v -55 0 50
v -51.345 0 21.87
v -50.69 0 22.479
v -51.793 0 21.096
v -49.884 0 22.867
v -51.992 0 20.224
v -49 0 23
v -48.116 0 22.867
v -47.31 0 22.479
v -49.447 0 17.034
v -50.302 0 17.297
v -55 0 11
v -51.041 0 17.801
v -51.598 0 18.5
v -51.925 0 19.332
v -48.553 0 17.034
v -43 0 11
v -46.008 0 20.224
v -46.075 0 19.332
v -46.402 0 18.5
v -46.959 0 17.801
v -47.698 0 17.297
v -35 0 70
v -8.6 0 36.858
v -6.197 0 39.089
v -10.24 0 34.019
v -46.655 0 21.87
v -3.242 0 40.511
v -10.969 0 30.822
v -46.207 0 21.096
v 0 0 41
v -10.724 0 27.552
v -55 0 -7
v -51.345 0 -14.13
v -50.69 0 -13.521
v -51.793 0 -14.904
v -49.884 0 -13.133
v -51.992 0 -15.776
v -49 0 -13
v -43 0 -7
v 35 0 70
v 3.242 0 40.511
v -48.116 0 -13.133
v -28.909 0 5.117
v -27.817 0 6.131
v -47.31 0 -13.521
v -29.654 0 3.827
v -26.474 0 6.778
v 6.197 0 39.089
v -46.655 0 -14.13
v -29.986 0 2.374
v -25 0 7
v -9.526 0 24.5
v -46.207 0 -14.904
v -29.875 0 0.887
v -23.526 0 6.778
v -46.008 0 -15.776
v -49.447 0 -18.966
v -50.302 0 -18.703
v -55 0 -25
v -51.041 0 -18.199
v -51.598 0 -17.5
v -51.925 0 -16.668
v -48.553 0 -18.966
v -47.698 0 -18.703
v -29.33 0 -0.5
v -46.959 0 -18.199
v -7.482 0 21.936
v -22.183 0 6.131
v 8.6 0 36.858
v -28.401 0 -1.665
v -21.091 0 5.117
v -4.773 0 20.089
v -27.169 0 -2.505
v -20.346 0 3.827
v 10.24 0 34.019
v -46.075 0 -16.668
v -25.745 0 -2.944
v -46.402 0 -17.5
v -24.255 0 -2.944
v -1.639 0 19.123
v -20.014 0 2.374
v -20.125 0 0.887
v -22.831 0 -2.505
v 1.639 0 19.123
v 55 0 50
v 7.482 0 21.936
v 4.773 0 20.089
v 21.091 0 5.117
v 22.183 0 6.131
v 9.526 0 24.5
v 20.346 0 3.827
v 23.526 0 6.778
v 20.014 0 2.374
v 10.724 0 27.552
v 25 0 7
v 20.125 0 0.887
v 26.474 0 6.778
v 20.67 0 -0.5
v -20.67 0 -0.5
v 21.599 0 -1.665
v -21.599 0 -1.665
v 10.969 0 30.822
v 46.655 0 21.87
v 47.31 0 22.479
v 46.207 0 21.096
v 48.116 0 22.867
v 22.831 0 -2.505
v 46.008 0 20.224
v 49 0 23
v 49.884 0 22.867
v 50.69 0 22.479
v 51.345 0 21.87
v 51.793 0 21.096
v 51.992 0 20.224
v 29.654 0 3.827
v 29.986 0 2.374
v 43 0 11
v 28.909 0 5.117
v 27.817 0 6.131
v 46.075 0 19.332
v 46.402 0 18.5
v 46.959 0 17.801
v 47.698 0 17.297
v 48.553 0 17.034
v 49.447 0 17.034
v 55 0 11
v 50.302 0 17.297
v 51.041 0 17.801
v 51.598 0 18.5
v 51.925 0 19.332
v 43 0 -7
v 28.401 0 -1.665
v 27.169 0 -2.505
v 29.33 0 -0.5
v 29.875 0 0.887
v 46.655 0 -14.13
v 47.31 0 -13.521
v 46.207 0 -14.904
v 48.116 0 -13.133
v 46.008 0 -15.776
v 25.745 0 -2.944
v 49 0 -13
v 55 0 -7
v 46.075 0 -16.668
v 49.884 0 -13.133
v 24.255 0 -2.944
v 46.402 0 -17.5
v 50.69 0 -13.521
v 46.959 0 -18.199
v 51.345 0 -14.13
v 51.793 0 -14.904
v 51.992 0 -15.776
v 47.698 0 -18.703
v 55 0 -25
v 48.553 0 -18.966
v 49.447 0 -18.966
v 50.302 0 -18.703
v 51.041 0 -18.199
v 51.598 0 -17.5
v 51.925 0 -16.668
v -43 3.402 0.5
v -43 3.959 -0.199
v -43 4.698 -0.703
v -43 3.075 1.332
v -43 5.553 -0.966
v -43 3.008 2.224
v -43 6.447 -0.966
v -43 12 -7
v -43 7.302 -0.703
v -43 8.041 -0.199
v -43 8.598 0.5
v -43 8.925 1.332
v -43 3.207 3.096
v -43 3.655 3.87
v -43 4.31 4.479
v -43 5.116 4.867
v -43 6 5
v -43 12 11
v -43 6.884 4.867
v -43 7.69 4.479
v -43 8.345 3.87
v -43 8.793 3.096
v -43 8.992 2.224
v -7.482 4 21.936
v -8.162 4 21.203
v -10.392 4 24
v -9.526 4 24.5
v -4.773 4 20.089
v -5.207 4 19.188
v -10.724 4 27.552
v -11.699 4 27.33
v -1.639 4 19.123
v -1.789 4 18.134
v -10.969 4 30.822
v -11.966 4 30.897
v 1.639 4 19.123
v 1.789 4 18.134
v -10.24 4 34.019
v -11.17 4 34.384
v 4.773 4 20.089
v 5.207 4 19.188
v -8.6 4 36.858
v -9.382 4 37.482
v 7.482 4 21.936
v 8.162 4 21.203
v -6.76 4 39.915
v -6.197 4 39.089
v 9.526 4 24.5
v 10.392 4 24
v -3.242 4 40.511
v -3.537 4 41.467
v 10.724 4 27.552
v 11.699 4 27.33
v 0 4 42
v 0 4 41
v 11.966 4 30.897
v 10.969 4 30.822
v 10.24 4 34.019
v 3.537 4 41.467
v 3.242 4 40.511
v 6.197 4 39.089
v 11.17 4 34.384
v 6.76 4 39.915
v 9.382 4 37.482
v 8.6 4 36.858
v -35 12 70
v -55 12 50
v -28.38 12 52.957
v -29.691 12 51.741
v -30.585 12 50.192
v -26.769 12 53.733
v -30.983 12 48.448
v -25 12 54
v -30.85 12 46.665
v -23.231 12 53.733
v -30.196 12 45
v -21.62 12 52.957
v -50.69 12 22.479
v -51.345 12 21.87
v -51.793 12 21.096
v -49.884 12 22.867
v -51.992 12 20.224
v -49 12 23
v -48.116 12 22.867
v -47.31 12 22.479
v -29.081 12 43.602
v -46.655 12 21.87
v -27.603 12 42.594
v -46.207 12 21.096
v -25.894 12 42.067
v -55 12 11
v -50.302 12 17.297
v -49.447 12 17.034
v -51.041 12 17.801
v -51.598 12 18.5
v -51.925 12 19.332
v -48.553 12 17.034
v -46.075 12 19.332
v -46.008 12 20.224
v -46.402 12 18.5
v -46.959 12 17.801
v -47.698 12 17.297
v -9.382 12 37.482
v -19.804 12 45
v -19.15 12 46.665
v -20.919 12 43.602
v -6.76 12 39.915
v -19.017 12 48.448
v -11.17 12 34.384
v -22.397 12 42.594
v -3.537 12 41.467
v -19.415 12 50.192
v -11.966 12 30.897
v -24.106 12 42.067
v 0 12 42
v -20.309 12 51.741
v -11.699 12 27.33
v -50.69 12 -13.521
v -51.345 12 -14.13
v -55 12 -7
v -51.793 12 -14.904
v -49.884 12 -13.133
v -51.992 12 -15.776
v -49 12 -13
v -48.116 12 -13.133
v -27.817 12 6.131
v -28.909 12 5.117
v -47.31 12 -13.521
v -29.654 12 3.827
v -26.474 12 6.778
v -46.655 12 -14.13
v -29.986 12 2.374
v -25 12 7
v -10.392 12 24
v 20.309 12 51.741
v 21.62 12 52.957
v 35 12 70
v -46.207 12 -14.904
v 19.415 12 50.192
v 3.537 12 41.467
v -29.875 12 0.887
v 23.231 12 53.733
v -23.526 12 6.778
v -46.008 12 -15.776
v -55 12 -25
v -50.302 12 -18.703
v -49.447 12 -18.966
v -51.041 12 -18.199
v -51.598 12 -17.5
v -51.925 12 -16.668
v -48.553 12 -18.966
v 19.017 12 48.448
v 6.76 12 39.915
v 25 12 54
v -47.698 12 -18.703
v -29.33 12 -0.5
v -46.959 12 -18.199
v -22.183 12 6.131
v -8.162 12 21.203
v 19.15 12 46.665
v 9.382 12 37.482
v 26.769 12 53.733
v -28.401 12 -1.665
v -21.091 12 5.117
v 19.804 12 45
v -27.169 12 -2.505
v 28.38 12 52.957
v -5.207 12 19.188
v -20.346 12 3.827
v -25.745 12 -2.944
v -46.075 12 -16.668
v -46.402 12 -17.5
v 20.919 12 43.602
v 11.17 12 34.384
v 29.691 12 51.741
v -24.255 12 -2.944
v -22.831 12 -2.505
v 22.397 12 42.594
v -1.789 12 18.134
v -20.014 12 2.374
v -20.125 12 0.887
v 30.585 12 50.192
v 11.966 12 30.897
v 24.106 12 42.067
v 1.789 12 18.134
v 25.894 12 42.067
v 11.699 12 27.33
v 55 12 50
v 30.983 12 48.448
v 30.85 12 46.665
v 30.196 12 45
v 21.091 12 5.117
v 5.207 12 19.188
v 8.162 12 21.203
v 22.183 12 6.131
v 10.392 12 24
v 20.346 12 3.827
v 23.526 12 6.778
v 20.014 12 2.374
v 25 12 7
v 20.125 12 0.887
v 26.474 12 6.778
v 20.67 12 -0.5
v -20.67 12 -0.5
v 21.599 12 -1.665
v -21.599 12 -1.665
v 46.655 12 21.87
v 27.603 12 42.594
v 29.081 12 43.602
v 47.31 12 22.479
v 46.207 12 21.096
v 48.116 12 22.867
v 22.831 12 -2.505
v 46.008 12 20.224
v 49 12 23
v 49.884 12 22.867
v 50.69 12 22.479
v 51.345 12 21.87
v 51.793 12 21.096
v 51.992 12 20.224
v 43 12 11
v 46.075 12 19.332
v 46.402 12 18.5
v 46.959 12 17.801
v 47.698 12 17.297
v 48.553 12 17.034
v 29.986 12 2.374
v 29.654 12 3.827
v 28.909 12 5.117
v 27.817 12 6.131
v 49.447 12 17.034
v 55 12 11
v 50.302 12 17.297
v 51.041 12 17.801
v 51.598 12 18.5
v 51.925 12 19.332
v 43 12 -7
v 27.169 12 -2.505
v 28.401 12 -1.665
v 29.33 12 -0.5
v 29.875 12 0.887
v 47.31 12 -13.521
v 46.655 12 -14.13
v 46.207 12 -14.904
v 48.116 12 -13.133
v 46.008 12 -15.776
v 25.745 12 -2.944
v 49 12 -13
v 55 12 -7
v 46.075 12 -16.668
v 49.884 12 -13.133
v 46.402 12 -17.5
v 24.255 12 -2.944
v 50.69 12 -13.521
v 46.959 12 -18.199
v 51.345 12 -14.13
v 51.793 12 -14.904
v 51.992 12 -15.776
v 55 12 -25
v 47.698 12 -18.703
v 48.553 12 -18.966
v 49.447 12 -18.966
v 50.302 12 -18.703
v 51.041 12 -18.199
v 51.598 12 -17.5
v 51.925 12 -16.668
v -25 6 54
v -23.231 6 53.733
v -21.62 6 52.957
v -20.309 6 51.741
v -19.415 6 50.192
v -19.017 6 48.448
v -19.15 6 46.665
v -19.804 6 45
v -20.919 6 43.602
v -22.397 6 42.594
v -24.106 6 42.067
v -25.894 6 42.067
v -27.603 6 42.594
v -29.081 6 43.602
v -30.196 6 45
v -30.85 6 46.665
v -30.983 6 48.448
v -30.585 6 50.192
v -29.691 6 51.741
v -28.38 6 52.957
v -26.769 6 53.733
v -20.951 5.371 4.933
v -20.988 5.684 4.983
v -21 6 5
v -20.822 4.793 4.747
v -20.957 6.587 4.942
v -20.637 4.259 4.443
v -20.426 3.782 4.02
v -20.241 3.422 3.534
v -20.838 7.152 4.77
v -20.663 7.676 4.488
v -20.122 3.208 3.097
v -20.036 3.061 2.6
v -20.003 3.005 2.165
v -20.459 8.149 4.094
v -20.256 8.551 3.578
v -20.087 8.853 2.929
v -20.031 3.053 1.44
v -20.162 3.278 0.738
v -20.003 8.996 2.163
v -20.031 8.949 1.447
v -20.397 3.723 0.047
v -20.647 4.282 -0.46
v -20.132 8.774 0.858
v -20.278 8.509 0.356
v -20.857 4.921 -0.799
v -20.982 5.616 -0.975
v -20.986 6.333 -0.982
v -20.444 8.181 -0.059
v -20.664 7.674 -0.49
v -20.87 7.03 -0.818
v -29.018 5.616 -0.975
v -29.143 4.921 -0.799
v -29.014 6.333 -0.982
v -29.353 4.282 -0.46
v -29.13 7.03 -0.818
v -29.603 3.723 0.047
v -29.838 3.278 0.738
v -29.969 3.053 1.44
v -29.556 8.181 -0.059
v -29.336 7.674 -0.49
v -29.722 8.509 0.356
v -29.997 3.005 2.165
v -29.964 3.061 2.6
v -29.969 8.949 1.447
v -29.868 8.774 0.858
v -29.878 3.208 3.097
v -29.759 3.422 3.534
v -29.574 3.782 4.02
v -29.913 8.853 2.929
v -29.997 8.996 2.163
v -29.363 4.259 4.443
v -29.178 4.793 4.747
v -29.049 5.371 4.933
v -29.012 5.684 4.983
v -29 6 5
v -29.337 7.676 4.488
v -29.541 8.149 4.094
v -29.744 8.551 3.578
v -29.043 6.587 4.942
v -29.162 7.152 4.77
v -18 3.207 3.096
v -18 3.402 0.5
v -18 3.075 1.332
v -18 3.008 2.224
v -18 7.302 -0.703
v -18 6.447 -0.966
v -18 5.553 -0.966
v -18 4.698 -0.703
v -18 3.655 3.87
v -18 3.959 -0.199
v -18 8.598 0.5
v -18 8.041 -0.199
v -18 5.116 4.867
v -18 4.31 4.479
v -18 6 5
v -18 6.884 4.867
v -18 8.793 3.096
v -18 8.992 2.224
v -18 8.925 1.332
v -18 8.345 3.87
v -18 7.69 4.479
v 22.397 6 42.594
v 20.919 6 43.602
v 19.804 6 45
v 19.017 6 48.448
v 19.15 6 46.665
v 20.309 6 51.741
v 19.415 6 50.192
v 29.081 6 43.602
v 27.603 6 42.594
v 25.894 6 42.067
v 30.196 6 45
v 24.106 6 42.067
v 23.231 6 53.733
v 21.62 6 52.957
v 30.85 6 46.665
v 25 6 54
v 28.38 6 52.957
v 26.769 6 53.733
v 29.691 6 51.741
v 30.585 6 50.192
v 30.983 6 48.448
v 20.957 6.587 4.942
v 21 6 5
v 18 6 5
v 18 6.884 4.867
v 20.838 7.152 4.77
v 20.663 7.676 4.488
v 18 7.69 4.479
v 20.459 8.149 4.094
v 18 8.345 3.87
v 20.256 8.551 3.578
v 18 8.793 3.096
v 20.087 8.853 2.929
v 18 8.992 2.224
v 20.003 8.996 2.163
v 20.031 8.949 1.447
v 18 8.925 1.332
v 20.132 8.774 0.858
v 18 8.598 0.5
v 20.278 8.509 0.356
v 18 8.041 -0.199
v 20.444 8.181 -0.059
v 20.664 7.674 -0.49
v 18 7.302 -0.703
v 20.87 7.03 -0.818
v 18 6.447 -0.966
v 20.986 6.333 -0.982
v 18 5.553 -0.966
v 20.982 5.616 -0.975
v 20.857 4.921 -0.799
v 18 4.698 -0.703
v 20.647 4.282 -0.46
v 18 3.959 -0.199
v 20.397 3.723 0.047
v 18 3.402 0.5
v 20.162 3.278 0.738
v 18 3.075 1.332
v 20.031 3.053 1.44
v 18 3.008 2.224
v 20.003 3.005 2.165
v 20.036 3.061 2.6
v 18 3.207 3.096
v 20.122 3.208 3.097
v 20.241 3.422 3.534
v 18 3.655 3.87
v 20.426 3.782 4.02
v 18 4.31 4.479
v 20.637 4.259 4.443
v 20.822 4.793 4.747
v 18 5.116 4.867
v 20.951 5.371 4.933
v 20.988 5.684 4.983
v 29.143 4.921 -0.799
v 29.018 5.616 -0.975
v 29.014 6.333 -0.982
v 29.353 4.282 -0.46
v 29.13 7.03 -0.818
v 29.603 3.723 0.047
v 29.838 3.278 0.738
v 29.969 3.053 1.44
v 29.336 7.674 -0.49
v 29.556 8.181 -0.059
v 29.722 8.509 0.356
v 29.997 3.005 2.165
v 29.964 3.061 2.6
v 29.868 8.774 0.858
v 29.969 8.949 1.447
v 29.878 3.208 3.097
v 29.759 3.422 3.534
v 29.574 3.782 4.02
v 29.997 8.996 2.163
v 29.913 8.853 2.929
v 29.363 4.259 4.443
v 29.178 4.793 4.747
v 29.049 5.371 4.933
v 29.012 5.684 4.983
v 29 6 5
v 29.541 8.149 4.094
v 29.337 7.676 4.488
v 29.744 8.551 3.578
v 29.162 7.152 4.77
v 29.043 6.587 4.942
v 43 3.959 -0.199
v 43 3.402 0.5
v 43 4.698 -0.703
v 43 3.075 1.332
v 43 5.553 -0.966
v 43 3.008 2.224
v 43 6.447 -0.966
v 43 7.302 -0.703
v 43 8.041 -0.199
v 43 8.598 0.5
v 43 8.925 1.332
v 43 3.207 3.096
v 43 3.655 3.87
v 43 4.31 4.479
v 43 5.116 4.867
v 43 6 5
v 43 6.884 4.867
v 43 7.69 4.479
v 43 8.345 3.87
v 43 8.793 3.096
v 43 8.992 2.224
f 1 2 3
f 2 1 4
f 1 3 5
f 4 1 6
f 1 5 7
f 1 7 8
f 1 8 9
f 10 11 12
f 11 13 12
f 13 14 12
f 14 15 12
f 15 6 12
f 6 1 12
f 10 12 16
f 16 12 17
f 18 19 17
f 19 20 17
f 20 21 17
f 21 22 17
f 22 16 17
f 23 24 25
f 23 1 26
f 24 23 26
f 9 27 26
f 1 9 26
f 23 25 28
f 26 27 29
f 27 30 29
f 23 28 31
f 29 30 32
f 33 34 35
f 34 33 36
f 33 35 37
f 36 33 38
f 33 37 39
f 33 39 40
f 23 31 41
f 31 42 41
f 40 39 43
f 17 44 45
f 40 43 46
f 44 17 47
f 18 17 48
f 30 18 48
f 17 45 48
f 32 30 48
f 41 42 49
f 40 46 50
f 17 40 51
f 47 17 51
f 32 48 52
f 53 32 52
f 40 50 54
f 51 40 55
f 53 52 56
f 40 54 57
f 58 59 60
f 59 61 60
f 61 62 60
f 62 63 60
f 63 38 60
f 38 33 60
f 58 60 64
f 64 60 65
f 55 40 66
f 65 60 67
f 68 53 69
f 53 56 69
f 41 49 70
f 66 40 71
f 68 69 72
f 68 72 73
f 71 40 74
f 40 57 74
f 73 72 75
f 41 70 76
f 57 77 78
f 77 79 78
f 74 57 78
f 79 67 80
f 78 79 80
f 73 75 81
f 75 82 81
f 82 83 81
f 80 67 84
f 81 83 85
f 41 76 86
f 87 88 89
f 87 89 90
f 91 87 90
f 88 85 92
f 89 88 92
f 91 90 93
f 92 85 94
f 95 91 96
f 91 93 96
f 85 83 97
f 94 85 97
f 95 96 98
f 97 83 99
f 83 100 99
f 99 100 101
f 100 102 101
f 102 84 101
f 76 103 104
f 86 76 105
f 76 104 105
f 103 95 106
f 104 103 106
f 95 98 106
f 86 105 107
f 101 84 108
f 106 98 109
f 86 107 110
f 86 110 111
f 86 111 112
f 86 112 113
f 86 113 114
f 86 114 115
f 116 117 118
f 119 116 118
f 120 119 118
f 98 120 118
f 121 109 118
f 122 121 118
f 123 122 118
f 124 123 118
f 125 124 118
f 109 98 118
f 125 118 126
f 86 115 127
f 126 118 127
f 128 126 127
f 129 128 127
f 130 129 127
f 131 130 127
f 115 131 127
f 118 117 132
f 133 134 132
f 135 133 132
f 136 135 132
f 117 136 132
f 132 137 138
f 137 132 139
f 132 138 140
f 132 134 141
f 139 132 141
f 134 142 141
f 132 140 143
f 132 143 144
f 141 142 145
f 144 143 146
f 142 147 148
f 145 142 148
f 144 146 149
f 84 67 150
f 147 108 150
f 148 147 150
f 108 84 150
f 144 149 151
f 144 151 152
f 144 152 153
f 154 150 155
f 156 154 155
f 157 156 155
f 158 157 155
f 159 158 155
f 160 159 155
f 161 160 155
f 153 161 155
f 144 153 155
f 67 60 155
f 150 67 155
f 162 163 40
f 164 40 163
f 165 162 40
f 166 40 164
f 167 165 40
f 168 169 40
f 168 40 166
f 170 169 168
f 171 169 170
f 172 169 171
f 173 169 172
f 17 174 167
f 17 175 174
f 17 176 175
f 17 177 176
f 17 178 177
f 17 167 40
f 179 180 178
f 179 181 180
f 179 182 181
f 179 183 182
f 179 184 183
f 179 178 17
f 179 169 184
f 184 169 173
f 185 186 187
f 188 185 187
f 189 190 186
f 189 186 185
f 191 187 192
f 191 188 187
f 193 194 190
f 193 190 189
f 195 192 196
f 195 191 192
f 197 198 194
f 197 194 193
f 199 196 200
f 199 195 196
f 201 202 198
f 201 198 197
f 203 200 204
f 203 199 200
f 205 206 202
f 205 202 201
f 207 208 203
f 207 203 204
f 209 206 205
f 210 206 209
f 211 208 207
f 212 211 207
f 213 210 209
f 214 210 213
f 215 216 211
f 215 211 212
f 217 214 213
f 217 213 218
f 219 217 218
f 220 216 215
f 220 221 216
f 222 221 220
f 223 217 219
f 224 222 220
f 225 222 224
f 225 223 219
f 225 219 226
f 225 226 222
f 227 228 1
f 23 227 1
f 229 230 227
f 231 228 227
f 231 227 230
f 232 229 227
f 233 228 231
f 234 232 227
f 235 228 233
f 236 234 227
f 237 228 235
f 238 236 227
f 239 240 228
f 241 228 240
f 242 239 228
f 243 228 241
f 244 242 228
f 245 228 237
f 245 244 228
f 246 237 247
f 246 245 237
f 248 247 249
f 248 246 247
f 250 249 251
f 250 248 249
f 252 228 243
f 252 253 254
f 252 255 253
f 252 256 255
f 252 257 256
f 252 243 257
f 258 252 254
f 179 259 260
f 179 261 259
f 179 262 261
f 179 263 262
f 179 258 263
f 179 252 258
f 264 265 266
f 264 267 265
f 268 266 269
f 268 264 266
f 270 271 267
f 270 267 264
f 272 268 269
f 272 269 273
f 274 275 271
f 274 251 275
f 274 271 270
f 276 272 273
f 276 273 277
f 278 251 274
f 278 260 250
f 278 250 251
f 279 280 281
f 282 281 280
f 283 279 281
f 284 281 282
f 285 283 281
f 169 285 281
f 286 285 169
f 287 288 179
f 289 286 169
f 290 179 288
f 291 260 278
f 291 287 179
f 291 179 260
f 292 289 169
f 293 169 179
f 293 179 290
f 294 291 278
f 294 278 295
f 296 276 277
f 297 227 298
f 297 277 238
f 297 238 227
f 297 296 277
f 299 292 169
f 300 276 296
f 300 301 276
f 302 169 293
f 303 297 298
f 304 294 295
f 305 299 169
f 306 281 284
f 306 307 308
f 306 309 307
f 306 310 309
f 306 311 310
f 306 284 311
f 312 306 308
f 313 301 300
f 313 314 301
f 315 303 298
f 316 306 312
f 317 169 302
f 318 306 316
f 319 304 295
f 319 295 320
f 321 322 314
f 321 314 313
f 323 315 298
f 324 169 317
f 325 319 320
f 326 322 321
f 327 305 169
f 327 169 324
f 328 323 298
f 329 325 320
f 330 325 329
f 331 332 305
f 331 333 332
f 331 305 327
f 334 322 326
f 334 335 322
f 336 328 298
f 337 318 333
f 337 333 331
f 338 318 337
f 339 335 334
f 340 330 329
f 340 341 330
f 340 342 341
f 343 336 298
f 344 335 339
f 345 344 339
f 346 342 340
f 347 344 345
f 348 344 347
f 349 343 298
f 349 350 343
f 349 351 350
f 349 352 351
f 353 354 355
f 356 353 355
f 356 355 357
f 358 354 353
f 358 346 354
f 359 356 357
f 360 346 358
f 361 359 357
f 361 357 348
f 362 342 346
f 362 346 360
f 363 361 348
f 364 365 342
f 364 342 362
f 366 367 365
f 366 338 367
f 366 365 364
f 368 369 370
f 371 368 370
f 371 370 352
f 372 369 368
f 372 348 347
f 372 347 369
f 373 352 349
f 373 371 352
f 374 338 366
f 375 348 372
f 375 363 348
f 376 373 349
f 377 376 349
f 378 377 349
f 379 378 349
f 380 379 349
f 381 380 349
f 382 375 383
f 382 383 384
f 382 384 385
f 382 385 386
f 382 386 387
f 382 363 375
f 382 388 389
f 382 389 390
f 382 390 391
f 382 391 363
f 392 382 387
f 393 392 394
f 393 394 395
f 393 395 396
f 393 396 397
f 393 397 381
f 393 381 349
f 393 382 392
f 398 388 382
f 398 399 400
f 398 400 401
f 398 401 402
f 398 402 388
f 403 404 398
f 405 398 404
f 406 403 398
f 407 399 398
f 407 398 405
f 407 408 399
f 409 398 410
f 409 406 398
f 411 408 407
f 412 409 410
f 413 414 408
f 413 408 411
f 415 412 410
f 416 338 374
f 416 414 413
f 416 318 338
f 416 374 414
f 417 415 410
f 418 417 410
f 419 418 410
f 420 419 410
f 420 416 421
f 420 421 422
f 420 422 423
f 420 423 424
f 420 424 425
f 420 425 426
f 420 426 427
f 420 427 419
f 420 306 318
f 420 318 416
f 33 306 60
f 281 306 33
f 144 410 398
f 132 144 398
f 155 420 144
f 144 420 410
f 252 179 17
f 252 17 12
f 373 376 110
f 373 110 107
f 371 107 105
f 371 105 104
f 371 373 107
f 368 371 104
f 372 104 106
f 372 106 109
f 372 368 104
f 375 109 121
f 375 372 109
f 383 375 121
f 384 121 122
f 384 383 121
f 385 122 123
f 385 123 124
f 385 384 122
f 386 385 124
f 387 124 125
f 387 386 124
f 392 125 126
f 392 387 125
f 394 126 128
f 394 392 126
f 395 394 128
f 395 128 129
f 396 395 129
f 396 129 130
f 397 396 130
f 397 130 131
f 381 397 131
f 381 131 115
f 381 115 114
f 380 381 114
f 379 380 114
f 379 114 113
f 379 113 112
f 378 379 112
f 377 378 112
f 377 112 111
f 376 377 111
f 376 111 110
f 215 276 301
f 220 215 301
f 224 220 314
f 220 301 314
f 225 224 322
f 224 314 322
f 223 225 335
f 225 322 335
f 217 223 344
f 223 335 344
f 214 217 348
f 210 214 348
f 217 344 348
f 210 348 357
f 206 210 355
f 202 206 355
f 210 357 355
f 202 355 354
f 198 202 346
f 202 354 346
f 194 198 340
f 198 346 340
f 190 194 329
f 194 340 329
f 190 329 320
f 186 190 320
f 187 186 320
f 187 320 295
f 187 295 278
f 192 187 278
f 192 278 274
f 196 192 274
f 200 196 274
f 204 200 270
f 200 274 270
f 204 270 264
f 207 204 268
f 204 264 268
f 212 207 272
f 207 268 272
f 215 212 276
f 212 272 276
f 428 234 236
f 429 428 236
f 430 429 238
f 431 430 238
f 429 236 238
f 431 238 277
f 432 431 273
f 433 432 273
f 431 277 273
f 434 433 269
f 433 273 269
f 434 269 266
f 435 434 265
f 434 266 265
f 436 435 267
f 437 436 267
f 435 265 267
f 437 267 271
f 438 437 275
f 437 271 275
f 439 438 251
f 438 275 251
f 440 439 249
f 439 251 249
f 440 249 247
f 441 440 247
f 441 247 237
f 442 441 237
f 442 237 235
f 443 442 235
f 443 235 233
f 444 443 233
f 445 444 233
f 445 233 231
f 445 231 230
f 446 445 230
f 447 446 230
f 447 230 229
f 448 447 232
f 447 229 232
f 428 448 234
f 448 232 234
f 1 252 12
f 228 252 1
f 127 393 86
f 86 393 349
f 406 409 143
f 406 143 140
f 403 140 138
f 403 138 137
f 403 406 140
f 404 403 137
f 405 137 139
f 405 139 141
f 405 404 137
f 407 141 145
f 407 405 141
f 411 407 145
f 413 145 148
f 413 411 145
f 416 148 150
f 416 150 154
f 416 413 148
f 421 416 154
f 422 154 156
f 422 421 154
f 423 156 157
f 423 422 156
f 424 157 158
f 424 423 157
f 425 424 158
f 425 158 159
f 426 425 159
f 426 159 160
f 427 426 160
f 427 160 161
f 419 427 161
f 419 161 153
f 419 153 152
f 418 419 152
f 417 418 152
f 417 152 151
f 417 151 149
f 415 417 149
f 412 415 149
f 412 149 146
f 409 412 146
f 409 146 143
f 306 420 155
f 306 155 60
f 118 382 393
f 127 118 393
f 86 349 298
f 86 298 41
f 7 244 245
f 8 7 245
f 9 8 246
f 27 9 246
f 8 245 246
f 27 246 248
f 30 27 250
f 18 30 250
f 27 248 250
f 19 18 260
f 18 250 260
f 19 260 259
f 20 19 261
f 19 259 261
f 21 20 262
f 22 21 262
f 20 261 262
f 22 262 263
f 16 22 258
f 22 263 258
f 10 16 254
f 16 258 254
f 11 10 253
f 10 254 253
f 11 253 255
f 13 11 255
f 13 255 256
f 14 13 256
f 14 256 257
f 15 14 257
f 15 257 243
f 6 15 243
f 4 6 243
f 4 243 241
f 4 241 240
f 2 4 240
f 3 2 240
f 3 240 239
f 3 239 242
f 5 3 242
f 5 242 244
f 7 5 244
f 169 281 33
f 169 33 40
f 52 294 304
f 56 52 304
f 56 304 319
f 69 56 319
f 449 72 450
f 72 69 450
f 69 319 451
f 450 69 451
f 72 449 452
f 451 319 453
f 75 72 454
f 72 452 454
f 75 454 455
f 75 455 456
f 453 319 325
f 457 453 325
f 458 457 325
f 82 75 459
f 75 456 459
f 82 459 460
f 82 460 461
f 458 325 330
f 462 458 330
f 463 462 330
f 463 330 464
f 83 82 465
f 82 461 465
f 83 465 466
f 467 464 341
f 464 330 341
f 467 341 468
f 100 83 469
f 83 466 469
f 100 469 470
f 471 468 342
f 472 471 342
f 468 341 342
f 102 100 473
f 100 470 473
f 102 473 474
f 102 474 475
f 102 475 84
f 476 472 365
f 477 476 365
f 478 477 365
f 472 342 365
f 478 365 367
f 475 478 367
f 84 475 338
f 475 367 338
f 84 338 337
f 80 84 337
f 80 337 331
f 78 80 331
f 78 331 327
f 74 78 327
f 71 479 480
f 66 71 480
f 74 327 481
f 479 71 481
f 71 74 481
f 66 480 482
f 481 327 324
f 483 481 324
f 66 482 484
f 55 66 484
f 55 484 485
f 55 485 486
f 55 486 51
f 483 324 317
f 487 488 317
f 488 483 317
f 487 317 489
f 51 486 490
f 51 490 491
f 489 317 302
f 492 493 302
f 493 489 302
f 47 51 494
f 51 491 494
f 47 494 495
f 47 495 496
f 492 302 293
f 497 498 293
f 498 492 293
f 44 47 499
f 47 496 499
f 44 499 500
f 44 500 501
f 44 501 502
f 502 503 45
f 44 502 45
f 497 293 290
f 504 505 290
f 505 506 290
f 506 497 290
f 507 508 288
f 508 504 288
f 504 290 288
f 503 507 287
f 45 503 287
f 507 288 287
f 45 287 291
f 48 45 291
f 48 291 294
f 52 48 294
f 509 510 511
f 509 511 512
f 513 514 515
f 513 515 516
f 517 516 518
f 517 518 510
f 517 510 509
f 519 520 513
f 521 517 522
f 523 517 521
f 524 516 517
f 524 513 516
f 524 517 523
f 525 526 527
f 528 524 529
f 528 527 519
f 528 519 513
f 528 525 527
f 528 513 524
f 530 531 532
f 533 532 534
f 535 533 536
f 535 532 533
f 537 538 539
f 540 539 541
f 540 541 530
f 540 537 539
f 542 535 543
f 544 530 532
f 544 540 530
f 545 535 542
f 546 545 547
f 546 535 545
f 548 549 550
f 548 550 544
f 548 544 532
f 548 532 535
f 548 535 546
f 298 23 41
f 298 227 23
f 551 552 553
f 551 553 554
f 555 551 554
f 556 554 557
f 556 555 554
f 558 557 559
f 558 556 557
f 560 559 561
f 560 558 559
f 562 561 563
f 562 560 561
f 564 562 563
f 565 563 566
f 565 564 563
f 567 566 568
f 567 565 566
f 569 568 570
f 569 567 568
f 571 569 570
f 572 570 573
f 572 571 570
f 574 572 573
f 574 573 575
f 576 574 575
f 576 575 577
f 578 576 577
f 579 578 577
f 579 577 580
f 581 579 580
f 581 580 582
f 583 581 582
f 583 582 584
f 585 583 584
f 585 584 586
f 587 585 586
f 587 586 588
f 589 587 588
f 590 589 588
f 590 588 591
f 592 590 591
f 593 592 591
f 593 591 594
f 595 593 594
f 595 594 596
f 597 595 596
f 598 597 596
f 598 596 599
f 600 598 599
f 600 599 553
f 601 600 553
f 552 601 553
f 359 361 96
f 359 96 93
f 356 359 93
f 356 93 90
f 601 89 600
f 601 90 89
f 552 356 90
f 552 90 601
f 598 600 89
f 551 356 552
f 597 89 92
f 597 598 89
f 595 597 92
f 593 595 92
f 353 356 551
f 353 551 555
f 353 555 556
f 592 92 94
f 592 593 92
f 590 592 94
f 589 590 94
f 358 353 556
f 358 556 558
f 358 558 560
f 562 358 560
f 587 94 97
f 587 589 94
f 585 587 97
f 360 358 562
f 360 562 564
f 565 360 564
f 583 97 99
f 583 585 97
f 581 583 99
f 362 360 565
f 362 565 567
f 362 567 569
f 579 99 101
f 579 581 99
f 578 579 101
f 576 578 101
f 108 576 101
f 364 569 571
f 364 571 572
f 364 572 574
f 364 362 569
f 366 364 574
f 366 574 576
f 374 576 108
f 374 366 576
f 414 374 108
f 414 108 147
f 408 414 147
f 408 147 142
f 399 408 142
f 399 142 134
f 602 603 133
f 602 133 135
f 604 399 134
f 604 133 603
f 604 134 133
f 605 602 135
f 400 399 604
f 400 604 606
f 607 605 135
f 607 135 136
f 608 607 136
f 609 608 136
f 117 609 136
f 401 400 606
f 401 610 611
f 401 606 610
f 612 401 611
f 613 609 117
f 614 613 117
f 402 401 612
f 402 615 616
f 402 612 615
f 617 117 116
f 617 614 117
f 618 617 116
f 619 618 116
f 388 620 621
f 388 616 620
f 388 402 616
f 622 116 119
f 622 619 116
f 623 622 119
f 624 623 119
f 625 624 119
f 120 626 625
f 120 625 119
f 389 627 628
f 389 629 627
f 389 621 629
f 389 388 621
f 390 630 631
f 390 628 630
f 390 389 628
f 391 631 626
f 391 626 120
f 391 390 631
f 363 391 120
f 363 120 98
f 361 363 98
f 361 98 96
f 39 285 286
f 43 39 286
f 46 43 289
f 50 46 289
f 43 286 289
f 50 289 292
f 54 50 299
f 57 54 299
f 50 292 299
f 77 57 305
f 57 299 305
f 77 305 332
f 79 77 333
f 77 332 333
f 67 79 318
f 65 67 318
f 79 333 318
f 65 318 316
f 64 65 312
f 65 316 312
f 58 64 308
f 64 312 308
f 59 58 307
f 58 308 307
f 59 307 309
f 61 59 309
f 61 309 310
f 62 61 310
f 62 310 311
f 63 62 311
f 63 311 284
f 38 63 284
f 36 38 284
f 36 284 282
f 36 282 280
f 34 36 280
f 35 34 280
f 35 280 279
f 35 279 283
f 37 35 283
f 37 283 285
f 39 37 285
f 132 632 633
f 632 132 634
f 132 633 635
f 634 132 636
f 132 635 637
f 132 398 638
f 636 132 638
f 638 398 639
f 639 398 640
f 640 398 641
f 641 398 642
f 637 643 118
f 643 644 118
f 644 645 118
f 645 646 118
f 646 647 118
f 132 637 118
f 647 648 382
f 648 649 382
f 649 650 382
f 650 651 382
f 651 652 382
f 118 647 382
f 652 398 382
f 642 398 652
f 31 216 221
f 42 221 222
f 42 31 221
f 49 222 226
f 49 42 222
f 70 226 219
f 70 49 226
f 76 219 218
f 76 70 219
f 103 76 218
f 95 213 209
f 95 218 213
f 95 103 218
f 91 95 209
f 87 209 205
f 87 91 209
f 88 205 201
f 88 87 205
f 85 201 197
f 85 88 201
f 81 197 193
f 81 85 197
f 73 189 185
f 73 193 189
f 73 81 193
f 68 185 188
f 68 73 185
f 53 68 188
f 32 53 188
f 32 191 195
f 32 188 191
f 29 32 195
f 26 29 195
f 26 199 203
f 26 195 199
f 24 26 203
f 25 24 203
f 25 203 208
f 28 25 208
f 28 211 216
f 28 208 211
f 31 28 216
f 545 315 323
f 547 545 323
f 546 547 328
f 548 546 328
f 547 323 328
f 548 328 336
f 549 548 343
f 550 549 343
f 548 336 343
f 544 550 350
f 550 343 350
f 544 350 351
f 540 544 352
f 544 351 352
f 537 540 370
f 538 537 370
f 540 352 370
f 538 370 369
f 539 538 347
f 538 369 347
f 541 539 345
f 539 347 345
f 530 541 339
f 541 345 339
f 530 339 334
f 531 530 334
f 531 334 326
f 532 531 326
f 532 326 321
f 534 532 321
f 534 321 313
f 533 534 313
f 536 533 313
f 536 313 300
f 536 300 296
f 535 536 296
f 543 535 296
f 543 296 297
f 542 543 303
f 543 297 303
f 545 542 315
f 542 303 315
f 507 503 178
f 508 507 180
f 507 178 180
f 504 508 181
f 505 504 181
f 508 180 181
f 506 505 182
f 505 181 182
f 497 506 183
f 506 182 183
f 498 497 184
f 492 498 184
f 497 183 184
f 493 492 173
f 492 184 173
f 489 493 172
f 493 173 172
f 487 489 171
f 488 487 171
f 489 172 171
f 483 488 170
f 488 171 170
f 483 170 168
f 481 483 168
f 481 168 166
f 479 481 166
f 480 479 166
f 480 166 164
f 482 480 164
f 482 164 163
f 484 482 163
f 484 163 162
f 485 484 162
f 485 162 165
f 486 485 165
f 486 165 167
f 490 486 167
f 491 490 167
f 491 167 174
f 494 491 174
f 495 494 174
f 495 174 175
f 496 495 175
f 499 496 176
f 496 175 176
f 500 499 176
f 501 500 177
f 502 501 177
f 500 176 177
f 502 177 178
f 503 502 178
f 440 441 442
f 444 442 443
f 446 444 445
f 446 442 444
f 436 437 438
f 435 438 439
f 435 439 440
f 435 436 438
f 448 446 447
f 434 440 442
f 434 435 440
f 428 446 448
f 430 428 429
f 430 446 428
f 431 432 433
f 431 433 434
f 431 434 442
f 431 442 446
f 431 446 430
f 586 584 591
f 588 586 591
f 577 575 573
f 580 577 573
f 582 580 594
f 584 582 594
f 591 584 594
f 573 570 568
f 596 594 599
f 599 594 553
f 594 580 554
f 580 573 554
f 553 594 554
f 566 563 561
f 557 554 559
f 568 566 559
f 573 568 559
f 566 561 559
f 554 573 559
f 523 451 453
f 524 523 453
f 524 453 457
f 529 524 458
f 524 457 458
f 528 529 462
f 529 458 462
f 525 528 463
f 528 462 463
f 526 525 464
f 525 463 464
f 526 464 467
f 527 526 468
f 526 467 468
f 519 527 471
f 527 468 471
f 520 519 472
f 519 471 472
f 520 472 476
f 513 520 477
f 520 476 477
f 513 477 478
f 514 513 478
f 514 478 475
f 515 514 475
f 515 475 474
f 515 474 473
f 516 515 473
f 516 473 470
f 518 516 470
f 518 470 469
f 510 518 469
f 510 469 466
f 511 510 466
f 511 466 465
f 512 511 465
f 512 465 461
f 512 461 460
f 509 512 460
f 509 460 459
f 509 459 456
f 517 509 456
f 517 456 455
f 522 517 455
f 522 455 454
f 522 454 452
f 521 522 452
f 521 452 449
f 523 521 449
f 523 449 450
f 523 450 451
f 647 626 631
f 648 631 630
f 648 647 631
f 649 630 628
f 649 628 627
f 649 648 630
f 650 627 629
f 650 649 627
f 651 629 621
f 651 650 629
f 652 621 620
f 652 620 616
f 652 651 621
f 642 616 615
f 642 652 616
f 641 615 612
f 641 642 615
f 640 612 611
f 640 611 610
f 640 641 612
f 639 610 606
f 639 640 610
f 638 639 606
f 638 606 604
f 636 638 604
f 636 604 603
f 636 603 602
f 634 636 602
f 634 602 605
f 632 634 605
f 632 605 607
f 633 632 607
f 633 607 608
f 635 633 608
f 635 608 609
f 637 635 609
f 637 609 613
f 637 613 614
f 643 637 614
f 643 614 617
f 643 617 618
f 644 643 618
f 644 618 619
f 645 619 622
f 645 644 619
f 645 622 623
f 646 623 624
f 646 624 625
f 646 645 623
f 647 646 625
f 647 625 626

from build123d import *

# Parameters (mm, degrees)
SKETCH1_W           = 66
SKETCH1_H           = 95
SKETCH1_R           = 11
BOSS_EXTRUDE1_DEPTH = 12
BOSS_EXTRUDE3_DEPTH = 12
SKETCH4_R           = 12
CUT_EXTRUDE1_DEPTH  = 8
SKETCH6_R           = 6
CUT_EXTRUDE2_DEPTH  = 6
CHAMFER1_SIZE       = 20
CUT_EXTRUDE3_REACH  = 91.828
SKETCH7_R           = 3
SKETCH7_R_2         = 5
SKETCH9_R           = 3
CUT_EXTRUDE5_DEPTH  = 25


with BuildPart() as part:
    # Sketch1 → Boss-Extrude1 (new body)
    with BuildSketch(Plane(origin=(0, 0, 0), x_dir=(1, 0, 0), z_dir=(0, 1, 0))):
        with Locations((0, -22.5)):
            Rectangle(SKETCH1_W, SKETCH1_H)
        with Locations(Location((0, -30, 0), (0, 0, 270))):
            Circle(SKETCH1_R, mode=Mode.SUBTRACT)
    extrude(amount=BOSS_EXTRUDE1_DEPTH)

    # Sketch3 → Boss-Extrude3 (add)
    with BuildSketch(Plane(origin=(0, 12, 0), x_dir=(1, 0, 0), z_dir=(0, 1, 0))):
        Polygon((55, 7), (43, 7), (43, -11), (55, -11), (55, -70), (33, -70), (33, 25), (55, 25), align=None)
    boss_extrude3 = extrude(amount=-BOSS_EXTRUDE3_DEPTH)

    # Mirror1: Boss-Extrude3 across plane
    add(boss_extrude3.mirror(Plane(origin=(0, 0, 0), x_dir=(0, 0, 1), z_dir=(1, 0, 0))))

    # Sketch4 → Cut-Extrude1 (cut)
    with BuildSketch(Plane(origin=(0, 12, 0), x_dir=(1, 0, 0), z_dir=(0, 1, 0))):
        with Locations(Location((0, -30, 0), (0, 0, 270))):
            Circle(SKETCH4_R)
    extrude(amount=-CUT_EXTRUDE1_DEPTH, mode=Mode.SUBTRACT)

    # Sketch6 → Cut-Extrude2 (cut)
    with BuildSketch(Plane(origin=(0, 12, 0), x_dir=(1, 0, 0), z_dir=(0, 1, 0))):
        with Locations(Location((-25, -48, 0), (0, 0, 270))):
            Circle(SKETCH6_R)
        with Locations(Location((25, -48, 0), (0, 0, 270))):
            Circle(SKETCH6_R)
    extrude(amount=-CUT_EXTRUDE2_DEPTH, mode=Mode.SUBTRACT)

    # Chamfer1
    chamfer1_edges = [part.edges().sort_by_distance(p)[0] for p in [
        (55, 6, 70),
        (-55, 6, 70),
    ]]
    chamfer(chamfer1_edges, length=CHAMFER1_SIZE)

    # Sketch7 → Cut-Extrude3 (cut, up to next)
    with BuildSketch(Plane(origin=(0, 12, 0), x_dir=(1, 0, 0), z_dir=(0, 1, 0)), mode=Mode.PRIVATE) as cut_extrude3_sk1:
        with Locations(Location((-49, 16, 0), (0, 0, 270))):
            Circle(SKETCH7_R)
    cut_extrude3_tool1 = extrude(cut_extrude3_sk1.sketch, amount=-CUT_EXTRUDE3_REACH, mode=Mode.PRIVATE) & part.part
    # Sketch7 → Cut-Extrude3 (cut, up to next)
    with BuildSketch(Plane(origin=(0, 12, 0), x_dir=(1, 0, 0), z_dir=(0, 1, 0)), mode=Mode.PRIVATE) as cut_extrude3_sk2:
        with Locations(Location((-49, -20, 0), (0, 0, 270))):
            Circle(SKETCH7_R)
    cut_extrude3_tool2 = extrude(cut_extrude3_sk2.sketch, amount=-CUT_EXTRUDE3_REACH, mode=Mode.PRIVATE) & part.part
    # Sketch7 → Cut-Extrude3 (cut, up to next)
    with BuildSketch(Plane(origin=(0, 12, 0), x_dir=(1, 0, 0), z_dir=(0, 1, 0)), mode=Mode.PRIVATE) as cut_extrude3_sk3:
        with Locations(Location((-25, -2, 0), (0, 0, 270))):
            Circle(SKETCH7_R_2)
    cut_extrude3_tool3 = extrude(cut_extrude3_sk3.sketch, amount=-CUT_EXTRUDE3_REACH, mode=Mode.PRIVATE) & part.part
    cut_extrude3_1 = cut_extrude3_tool1.solids().sort_by_distance((-49, 12, -16))[0]
    add(cut_extrude3_1, mode=Mode.SUBTRACT)
    cut_extrude3_2 = cut_extrude3_tool2.solids().sort_by_distance((-49, 12, 20))[0]
    add(cut_extrude3_2, mode=Mode.SUBTRACT)
    cut_extrude3_3 = cut_extrude3_tool3.solids().sort_by_distance((-25, 12, 2))[0]
    add(cut_extrude3_3, mode=Mode.SUBTRACT)
    cut_extrude3 = cut_extrude3_1 + cut_extrude3_2 + cut_extrude3_3  # Cut-Extrude3 as one shape, for the pattern or mirror that repeats it

    # Sketch9 → Cut-Extrude5 (cut)
    with BuildSketch(Plane.ZY.offset(43)):
        with Locations((2, 6)):
            Circle(SKETCH9_R)
    cut_extrude5 = extrude(amount=-CUT_EXTRUDE5_DEPTH, mode=Mode.SUBTRACT)

    # Mirror2: Cut-Extrude3, Cut-Extrude5 across plane
    add(cut_extrude3.mirror(Plane(origin=(0, 0, 0), x_dir=(0, 0, 1), z_dir=(1, 0, 0))), mode=Mode.SUBTRACT)
    add(cut_extrude5.mirror(Plane(origin=(0, 0, 0), x_dir=(0, 0, 1), z_dir=(1, 0, 0))), mode=Mode.SUBTRACT)


solid = part.part
